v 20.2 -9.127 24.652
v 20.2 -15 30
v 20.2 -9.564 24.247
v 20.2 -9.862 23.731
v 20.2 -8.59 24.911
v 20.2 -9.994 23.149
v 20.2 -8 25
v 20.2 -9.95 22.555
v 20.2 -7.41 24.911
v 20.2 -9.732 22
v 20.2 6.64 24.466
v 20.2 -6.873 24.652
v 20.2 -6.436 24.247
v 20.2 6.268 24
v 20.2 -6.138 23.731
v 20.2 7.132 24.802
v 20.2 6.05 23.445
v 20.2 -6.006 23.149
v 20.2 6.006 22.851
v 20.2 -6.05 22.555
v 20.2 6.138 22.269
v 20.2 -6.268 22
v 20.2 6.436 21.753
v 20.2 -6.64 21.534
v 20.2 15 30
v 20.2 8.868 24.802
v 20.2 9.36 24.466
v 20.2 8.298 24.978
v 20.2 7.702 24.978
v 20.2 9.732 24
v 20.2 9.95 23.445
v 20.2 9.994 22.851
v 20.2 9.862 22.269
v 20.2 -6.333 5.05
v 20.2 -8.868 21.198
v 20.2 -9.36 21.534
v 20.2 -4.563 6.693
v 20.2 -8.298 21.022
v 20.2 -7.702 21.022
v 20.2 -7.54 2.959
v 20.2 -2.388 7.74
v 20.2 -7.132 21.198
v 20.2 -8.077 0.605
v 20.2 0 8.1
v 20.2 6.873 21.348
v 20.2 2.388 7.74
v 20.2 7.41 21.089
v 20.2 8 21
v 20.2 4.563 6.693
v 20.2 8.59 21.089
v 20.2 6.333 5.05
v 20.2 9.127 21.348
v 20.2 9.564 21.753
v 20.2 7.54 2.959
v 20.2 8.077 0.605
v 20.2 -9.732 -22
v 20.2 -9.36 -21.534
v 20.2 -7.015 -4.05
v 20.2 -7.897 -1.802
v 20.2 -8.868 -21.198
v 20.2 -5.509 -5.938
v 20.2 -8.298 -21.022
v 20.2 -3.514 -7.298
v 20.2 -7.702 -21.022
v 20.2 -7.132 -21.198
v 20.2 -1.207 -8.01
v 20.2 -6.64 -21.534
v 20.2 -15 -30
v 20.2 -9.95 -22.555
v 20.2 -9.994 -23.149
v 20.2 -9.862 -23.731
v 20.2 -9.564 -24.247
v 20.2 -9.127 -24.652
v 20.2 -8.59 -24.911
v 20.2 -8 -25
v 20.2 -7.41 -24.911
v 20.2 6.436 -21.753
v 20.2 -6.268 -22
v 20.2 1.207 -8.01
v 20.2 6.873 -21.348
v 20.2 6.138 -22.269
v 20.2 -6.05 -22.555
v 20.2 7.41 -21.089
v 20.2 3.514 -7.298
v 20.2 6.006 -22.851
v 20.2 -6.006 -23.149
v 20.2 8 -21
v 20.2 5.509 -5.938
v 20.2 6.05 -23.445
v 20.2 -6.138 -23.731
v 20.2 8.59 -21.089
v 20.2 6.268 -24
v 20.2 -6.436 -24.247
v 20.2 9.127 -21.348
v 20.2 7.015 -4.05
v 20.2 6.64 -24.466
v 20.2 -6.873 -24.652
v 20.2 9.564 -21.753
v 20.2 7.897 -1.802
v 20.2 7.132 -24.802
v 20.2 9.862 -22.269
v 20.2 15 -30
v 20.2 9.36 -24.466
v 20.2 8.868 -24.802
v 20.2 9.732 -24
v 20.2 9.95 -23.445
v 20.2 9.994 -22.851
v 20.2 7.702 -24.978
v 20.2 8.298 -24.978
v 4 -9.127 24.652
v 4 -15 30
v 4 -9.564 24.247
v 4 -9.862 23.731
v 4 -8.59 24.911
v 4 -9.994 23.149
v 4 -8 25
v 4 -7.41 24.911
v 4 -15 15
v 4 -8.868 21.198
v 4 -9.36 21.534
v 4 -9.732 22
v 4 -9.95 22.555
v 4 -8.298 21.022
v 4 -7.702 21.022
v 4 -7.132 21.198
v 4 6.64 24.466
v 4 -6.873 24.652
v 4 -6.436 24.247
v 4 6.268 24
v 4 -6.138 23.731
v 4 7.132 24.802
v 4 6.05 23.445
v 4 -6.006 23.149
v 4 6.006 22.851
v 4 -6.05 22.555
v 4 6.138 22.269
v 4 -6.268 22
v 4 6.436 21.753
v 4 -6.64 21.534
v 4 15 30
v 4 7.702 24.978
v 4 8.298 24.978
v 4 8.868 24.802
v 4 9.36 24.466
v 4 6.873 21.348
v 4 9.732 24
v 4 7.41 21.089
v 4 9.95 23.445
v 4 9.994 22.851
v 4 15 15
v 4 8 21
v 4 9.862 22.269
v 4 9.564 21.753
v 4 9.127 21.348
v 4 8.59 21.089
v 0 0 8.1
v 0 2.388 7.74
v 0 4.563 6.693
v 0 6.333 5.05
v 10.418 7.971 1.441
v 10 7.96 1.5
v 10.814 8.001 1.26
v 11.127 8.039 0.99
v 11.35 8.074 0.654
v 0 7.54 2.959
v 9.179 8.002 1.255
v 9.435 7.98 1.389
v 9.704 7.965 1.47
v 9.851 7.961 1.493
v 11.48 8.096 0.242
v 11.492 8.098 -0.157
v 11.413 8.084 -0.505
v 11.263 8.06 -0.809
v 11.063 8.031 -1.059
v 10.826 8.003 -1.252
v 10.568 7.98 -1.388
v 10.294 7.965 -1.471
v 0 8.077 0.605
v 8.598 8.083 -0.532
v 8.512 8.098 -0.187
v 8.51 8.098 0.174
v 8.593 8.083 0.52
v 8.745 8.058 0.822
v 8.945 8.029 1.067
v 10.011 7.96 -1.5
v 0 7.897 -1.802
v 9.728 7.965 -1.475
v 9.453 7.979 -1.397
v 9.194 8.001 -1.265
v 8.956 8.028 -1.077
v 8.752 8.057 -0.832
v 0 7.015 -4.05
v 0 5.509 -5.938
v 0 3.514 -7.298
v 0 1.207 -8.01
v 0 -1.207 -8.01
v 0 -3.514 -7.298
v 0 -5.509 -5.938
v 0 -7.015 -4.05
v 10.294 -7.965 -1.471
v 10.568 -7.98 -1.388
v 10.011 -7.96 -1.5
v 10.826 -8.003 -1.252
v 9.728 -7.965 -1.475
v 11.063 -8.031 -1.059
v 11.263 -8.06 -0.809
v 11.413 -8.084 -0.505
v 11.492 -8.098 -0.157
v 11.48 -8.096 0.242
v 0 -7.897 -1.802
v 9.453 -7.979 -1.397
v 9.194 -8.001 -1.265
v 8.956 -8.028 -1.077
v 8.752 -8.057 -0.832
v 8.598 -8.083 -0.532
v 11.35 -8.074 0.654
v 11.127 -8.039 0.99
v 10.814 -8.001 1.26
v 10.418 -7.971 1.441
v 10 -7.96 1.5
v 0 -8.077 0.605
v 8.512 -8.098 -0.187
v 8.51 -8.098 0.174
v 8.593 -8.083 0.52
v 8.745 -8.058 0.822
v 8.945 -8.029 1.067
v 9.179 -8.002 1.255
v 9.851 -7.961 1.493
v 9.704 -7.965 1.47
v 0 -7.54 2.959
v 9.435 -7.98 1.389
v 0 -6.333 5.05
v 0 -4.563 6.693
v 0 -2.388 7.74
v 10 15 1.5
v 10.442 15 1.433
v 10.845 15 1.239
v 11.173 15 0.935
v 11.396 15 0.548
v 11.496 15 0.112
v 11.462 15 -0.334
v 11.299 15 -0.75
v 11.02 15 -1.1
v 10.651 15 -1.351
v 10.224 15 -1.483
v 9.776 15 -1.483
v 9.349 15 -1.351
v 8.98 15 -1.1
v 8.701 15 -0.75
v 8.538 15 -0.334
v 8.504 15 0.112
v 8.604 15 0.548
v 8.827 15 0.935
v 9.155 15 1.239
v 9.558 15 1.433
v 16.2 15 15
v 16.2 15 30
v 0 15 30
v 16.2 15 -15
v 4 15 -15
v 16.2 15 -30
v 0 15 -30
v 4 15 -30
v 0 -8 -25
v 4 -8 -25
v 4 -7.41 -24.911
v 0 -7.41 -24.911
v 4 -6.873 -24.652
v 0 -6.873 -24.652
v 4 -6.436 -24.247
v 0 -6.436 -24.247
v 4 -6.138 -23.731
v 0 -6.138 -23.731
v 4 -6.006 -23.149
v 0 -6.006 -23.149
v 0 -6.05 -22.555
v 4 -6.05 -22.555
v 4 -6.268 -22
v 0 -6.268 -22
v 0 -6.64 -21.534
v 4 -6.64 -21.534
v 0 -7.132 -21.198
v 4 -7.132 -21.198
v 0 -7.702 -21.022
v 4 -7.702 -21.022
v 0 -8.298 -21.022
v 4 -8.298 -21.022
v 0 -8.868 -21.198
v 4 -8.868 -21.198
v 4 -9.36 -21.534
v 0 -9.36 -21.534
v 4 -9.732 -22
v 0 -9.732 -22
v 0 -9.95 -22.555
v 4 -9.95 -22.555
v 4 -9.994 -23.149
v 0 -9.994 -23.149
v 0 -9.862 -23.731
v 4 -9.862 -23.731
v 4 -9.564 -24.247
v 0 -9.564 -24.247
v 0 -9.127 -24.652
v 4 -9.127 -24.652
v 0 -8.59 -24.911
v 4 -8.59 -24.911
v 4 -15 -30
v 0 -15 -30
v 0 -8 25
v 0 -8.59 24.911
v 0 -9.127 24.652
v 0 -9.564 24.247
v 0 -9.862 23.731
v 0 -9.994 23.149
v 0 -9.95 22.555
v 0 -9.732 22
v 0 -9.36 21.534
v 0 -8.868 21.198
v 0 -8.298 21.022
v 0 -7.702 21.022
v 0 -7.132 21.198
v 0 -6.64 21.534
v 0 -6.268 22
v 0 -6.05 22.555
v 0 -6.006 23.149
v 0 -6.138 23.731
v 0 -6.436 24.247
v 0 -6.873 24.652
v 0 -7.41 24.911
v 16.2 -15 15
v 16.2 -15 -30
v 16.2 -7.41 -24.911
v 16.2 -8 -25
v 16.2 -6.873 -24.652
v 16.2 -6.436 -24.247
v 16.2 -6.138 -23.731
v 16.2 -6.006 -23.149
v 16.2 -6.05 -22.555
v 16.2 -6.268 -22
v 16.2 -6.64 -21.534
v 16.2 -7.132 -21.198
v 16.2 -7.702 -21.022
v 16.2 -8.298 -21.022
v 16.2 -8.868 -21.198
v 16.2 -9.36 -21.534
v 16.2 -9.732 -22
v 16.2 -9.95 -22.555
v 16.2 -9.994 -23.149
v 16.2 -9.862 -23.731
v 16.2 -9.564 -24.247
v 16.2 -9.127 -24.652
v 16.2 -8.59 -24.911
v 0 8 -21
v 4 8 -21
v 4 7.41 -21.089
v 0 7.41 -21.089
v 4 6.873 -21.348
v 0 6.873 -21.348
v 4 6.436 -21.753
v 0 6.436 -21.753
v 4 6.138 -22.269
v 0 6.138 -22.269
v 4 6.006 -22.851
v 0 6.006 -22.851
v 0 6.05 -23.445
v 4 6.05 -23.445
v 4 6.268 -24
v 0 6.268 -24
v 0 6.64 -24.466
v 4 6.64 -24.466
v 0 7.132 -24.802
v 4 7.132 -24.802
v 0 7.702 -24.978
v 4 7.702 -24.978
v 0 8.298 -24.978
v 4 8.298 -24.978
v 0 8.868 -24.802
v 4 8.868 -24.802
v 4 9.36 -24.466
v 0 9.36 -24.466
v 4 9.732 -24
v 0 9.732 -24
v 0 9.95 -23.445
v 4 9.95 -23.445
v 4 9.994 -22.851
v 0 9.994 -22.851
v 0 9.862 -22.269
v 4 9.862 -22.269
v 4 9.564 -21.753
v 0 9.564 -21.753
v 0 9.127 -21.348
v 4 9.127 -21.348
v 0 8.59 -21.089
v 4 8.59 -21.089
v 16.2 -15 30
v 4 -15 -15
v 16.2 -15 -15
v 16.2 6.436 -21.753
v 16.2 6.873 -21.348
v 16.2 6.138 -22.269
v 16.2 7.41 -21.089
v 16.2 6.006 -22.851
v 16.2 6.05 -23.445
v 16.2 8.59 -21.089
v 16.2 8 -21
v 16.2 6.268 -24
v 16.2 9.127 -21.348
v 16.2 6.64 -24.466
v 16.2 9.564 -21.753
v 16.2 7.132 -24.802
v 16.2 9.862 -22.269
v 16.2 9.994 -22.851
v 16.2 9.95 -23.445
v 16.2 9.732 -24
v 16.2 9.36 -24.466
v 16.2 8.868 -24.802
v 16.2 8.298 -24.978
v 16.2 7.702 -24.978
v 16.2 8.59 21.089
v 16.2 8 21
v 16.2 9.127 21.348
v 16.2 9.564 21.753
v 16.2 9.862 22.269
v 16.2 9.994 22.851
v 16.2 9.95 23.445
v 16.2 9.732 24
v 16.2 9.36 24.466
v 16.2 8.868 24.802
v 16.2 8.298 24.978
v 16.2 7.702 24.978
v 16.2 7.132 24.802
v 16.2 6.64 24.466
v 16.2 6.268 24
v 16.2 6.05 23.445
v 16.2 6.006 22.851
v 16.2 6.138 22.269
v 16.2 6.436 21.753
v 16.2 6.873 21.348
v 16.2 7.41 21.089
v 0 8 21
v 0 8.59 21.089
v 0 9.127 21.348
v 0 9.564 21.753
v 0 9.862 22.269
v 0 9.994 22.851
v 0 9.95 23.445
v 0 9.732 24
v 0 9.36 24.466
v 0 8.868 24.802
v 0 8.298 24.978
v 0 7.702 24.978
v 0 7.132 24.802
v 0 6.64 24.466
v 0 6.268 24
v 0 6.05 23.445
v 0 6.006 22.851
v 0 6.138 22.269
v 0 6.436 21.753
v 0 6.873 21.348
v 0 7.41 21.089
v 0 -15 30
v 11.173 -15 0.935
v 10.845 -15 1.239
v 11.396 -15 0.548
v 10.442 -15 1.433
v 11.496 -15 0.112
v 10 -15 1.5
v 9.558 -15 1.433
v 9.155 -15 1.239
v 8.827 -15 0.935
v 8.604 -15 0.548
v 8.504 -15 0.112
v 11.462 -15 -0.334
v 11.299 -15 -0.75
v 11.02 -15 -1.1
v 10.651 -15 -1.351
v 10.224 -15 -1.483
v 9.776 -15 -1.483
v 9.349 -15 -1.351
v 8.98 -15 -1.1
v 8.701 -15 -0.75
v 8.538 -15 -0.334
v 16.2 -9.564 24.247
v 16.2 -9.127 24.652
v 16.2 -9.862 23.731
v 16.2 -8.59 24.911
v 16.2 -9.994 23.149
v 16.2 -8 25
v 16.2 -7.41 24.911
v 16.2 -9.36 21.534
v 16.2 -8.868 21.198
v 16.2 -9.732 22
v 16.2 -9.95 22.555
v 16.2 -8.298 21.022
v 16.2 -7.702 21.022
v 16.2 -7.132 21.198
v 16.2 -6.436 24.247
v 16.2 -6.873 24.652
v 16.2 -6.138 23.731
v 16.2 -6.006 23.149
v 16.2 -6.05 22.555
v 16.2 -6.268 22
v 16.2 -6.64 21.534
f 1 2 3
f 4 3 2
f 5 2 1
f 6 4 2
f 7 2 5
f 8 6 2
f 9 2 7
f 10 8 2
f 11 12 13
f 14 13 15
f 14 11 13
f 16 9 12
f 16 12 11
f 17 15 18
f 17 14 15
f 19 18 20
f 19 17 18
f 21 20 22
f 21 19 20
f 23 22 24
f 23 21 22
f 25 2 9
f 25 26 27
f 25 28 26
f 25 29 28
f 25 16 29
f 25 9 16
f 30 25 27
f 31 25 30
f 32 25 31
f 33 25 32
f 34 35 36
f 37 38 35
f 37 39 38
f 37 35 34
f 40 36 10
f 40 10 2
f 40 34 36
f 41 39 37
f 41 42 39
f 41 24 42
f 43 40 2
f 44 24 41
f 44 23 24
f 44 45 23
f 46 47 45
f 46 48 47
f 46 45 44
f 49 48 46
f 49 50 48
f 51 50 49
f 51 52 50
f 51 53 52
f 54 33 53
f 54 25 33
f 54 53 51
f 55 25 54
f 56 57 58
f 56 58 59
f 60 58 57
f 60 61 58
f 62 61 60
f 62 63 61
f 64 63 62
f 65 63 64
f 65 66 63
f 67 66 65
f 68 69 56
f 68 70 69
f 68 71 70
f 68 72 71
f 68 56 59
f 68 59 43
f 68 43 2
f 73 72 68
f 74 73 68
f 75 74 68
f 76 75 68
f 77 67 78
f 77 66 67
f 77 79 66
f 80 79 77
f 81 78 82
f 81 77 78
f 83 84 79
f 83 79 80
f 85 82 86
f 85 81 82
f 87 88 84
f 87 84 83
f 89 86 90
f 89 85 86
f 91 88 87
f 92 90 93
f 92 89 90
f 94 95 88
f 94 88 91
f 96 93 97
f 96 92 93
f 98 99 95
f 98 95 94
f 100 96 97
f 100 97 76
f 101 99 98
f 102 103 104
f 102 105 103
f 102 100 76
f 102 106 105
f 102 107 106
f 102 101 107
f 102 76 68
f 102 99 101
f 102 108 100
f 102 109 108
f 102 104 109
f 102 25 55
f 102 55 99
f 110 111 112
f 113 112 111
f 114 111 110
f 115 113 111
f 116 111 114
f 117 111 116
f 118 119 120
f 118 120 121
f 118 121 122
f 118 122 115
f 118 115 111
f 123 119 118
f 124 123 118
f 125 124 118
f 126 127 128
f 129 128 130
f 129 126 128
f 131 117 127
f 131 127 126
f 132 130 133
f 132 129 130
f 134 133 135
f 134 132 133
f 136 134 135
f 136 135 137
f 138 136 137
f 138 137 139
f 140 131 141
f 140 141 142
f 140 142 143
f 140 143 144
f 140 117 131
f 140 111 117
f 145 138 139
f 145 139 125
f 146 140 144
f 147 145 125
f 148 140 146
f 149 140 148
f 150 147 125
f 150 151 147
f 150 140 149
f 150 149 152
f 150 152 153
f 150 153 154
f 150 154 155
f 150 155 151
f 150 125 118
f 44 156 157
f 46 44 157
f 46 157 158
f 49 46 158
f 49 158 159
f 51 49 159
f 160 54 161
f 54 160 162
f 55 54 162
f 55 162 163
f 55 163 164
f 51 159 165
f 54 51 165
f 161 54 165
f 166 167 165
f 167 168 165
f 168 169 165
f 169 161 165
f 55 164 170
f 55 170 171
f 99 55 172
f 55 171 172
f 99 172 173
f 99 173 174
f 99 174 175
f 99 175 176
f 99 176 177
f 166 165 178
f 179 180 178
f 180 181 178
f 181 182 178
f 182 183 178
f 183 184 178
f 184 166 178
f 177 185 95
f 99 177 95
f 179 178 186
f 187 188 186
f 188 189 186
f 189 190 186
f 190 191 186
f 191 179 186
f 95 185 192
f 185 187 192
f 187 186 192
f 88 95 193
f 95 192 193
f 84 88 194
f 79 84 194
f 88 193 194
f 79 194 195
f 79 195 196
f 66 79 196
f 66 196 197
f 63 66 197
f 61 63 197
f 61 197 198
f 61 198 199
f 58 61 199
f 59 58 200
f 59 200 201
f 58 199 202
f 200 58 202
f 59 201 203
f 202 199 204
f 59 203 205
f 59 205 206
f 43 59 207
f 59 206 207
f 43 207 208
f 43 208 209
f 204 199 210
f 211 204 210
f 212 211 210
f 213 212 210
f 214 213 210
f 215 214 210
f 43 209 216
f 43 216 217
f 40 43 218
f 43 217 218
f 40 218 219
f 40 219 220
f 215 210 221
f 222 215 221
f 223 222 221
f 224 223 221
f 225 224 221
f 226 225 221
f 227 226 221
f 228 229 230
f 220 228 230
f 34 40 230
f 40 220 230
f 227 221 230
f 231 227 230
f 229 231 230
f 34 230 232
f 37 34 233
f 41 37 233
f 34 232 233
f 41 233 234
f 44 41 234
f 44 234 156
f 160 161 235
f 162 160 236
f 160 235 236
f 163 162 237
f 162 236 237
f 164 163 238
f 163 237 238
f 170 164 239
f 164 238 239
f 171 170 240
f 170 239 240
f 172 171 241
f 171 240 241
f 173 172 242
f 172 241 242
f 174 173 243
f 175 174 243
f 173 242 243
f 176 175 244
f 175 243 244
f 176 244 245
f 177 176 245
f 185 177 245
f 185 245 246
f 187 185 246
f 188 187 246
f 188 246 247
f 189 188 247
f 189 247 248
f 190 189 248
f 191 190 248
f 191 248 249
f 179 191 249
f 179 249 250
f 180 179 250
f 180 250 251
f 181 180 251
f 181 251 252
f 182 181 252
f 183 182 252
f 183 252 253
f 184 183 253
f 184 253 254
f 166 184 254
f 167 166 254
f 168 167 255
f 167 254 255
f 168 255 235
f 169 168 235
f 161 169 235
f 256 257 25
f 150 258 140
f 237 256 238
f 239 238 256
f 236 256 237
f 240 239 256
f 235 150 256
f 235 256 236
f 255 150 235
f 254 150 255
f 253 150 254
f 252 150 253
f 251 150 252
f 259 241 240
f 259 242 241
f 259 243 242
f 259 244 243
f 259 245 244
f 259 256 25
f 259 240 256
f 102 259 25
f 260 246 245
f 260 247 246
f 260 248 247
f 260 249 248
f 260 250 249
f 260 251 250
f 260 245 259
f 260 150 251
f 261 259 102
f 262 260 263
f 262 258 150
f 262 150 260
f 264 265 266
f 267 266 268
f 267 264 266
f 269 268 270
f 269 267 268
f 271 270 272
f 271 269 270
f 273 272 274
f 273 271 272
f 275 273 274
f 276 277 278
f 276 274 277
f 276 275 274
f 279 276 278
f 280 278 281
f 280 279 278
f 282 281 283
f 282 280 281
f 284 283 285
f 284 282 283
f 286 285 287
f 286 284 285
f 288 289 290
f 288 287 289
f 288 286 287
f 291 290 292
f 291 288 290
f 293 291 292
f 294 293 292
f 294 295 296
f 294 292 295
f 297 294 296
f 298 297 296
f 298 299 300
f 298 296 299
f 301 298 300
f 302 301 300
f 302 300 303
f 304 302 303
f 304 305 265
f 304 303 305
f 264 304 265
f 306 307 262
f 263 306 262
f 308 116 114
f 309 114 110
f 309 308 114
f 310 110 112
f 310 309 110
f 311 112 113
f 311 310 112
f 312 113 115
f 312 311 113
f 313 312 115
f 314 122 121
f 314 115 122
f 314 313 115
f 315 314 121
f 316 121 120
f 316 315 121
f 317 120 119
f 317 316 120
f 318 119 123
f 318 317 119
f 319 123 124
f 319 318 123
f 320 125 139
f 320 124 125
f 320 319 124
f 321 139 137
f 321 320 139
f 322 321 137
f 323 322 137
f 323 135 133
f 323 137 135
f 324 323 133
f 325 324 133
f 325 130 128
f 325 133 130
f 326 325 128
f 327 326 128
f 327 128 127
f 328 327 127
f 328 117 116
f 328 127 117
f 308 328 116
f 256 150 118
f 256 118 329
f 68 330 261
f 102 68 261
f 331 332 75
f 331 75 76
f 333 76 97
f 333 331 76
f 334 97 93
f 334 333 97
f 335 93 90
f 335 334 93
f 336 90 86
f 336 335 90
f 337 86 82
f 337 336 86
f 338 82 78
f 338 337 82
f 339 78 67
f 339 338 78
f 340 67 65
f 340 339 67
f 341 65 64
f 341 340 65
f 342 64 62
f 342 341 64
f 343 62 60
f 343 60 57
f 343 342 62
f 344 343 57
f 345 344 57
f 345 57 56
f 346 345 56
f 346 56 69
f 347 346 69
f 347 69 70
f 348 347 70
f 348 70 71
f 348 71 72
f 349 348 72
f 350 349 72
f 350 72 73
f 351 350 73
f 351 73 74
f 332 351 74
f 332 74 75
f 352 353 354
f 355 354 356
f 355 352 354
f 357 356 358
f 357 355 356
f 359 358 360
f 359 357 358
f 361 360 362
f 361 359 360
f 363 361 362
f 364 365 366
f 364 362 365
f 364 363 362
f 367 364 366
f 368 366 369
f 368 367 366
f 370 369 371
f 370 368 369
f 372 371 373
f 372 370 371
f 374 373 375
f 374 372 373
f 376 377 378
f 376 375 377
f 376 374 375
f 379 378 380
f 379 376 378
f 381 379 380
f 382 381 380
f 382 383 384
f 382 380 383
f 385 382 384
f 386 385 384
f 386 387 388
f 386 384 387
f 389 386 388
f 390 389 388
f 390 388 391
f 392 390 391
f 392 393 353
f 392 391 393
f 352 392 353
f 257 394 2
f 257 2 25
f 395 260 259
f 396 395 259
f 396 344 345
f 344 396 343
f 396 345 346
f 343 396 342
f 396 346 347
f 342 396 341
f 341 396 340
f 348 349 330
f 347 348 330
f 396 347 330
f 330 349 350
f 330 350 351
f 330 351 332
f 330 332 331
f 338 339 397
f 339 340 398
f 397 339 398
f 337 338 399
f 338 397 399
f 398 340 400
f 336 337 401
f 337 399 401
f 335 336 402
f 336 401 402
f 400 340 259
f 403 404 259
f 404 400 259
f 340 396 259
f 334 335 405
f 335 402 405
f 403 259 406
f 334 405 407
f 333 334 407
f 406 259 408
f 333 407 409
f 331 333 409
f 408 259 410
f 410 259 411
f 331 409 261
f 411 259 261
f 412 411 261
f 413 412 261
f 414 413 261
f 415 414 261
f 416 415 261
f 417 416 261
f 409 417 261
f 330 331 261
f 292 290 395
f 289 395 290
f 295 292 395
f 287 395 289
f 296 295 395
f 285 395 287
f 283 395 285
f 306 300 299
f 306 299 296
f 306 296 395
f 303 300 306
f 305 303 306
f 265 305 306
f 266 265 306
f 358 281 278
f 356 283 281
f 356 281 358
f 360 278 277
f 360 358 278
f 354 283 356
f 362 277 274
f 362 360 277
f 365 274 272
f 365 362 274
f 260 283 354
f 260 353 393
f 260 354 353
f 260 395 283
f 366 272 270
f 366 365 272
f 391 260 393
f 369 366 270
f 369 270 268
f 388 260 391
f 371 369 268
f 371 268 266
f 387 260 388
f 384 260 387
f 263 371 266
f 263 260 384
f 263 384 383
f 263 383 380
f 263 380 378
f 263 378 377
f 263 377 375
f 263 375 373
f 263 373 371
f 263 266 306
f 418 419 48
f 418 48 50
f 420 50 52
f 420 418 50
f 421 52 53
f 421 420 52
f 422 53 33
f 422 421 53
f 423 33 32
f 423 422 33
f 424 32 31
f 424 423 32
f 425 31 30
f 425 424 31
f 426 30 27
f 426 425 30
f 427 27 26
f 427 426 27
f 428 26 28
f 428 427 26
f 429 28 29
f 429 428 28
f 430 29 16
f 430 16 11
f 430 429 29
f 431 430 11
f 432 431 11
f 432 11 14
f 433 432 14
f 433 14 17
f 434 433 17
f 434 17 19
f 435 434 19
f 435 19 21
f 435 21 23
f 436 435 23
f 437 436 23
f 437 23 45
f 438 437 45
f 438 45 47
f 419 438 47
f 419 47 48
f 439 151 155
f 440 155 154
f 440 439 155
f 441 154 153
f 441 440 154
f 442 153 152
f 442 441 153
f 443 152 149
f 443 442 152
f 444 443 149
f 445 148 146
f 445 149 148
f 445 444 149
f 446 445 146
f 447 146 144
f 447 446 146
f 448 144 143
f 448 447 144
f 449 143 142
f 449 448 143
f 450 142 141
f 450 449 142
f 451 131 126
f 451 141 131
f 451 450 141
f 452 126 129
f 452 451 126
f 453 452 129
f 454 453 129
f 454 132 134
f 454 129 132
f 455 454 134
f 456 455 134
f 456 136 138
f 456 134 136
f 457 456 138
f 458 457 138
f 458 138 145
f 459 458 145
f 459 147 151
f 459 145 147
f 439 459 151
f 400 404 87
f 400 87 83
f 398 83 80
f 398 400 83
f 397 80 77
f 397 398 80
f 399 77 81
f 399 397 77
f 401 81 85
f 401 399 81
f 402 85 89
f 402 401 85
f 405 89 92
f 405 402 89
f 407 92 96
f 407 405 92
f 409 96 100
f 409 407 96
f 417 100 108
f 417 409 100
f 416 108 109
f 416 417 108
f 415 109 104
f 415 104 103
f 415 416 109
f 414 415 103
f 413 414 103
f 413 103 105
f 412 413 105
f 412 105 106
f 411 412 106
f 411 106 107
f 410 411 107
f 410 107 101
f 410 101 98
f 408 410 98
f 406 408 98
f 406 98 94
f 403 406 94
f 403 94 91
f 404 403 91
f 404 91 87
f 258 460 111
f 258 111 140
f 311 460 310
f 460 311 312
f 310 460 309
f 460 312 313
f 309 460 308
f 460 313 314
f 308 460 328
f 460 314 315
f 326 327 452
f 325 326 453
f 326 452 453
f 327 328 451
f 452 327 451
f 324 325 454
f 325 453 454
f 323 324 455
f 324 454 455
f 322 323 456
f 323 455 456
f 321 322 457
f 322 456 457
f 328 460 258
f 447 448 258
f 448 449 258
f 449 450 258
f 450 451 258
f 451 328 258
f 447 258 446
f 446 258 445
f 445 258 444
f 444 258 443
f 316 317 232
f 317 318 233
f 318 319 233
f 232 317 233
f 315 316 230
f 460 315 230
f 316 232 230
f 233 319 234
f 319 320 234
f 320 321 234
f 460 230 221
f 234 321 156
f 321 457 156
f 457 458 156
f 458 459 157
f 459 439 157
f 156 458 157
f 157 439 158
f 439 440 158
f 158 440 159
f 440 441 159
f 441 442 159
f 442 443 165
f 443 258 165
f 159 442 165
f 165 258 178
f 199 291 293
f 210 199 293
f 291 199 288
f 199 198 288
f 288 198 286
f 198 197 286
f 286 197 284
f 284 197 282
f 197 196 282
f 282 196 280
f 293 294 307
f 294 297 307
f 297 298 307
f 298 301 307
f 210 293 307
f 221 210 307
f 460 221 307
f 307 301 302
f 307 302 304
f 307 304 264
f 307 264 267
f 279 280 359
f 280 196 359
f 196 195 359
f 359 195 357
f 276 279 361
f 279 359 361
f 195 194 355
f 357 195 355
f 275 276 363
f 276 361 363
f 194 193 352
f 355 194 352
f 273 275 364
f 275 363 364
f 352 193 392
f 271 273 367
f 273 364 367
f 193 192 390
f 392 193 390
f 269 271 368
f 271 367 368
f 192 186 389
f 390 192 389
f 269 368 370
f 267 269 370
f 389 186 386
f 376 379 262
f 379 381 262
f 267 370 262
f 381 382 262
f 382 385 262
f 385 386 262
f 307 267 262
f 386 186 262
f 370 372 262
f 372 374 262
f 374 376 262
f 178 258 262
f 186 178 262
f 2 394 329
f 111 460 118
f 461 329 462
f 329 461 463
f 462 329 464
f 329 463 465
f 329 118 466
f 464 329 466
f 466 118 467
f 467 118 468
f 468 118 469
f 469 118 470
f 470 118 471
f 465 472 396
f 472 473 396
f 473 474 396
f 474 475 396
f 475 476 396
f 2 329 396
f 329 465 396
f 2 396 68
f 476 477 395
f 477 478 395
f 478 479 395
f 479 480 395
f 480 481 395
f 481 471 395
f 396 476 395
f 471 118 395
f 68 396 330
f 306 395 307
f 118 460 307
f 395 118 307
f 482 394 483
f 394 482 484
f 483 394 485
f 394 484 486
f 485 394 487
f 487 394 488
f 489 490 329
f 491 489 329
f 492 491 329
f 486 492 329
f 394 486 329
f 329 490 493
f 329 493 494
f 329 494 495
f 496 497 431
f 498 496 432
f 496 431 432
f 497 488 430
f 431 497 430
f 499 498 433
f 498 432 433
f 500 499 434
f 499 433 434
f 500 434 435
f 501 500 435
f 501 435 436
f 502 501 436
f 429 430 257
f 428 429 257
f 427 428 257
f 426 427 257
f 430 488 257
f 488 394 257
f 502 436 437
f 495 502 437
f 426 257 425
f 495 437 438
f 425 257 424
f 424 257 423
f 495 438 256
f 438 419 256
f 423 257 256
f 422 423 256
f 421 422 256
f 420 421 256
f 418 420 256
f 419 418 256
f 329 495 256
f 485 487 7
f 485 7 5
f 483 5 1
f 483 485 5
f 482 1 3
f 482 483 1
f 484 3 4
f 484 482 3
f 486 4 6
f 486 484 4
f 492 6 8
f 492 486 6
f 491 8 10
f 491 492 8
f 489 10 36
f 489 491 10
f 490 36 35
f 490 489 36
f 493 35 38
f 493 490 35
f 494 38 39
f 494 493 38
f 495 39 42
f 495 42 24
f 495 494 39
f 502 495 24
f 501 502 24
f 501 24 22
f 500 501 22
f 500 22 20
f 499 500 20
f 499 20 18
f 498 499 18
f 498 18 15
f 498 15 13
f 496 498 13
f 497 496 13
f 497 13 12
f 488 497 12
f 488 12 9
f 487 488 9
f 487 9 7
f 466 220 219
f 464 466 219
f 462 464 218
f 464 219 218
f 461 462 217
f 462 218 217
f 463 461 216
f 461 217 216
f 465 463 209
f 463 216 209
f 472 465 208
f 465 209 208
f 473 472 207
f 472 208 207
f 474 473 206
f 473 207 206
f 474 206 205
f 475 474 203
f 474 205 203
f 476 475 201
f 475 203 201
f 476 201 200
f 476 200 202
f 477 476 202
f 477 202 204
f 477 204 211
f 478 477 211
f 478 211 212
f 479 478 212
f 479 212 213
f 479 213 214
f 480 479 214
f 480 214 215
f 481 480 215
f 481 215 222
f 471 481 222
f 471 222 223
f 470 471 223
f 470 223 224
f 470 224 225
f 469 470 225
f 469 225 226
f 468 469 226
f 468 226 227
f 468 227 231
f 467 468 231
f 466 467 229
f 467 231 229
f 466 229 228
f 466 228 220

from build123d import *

# Parameters (mm, degrees)
SKETCH_1_W          = 60
SKETCH_1_H          = 30
SKETCH_1_R          = 2
EXTRUDE_1_DEPTH     = 20.2
SKETCH_2_W          = 12.2
SKETCH_2_H          = 15
CUT_EXTRUDE_1_DEPTH = 47.989786124
SKETCH_3_R          = 8.1
CUT_EXTRUDE_2_DEPTH = 40.154054707
SKETCH_4_R          = 1.5
CUT_EXTRUDE_3_DEPTH = 47.989786124


with BuildPart() as part:
    # 스케치1 → 보스-돌출1 (new body)
    with BuildSketch(Plane(origin=(0, 0, 0), x_dir=(0, 0, -1), z_dir=(1, 0, 0))):
        Rectangle(SKETCH_1_W, SKETCH_1_H)
        with Locations((-23, 8)):
            Circle(SKETCH_1_R, mode=Mode.SUBTRACT)
        with Locations(Location((-23, -8, 0), (0, 0, 180))):
            Circle(SKETCH_1_R, mode=Mode.SUBTRACT)
        with Locations((23, -8)):
            Circle(SKETCH_1_R, mode=Mode.SUBTRACT)
        with Locations(Location((23, 8, 0), (0, 0, 180))):
            Circle(SKETCH_1_R, mode=Mode.SUBTRACT)
    extrude(amount=EXTRUDE_1_DEPTH)

    # 스케치2 → 컷-돌출1 (cut, through all)
    with BuildSketch(Plane(origin=(0, 15, 0), x_dir=(1, 0, 0), z_dir=(0, 1, 0))):
        with Locations((10.1, 22.5)):
            Rectangle(SKETCH_2_W, SKETCH_2_H)
        with Locations((10.1, -22.5)):
            Rectangle(SKETCH_2_W, SKETCH_2_H)
    extrude(amount=-CUT_EXTRUDE_1_DEPTH, mode=Mode.SUBTRACT)

    # 스케치3 → 컷-돌출2 (cut, through all)
    with BuildSketch(Plane.ZY):
        Circle(SKETCH_3_R)
    extrude(amount=-CUT_EXTRUDE_2_DEPTH, mode=Mode.SUBTRACT)

    # 스케치4 → 컷-돌출3 (cut, through all)
    with BuildSketch(Plane(origin=(0, 15, 0), x_dir=(1, 0, 0), z_dir=(0, 1, 0))):
        with Locations(Location((10, 0, 0), (0, 0, 270))):
            Circle(SKETCH_4_R)
    extrude(amount=-CUT_EXTRUDE_3_DEPTH, mode=Mode.SUBTRACT)


solid = part.part
